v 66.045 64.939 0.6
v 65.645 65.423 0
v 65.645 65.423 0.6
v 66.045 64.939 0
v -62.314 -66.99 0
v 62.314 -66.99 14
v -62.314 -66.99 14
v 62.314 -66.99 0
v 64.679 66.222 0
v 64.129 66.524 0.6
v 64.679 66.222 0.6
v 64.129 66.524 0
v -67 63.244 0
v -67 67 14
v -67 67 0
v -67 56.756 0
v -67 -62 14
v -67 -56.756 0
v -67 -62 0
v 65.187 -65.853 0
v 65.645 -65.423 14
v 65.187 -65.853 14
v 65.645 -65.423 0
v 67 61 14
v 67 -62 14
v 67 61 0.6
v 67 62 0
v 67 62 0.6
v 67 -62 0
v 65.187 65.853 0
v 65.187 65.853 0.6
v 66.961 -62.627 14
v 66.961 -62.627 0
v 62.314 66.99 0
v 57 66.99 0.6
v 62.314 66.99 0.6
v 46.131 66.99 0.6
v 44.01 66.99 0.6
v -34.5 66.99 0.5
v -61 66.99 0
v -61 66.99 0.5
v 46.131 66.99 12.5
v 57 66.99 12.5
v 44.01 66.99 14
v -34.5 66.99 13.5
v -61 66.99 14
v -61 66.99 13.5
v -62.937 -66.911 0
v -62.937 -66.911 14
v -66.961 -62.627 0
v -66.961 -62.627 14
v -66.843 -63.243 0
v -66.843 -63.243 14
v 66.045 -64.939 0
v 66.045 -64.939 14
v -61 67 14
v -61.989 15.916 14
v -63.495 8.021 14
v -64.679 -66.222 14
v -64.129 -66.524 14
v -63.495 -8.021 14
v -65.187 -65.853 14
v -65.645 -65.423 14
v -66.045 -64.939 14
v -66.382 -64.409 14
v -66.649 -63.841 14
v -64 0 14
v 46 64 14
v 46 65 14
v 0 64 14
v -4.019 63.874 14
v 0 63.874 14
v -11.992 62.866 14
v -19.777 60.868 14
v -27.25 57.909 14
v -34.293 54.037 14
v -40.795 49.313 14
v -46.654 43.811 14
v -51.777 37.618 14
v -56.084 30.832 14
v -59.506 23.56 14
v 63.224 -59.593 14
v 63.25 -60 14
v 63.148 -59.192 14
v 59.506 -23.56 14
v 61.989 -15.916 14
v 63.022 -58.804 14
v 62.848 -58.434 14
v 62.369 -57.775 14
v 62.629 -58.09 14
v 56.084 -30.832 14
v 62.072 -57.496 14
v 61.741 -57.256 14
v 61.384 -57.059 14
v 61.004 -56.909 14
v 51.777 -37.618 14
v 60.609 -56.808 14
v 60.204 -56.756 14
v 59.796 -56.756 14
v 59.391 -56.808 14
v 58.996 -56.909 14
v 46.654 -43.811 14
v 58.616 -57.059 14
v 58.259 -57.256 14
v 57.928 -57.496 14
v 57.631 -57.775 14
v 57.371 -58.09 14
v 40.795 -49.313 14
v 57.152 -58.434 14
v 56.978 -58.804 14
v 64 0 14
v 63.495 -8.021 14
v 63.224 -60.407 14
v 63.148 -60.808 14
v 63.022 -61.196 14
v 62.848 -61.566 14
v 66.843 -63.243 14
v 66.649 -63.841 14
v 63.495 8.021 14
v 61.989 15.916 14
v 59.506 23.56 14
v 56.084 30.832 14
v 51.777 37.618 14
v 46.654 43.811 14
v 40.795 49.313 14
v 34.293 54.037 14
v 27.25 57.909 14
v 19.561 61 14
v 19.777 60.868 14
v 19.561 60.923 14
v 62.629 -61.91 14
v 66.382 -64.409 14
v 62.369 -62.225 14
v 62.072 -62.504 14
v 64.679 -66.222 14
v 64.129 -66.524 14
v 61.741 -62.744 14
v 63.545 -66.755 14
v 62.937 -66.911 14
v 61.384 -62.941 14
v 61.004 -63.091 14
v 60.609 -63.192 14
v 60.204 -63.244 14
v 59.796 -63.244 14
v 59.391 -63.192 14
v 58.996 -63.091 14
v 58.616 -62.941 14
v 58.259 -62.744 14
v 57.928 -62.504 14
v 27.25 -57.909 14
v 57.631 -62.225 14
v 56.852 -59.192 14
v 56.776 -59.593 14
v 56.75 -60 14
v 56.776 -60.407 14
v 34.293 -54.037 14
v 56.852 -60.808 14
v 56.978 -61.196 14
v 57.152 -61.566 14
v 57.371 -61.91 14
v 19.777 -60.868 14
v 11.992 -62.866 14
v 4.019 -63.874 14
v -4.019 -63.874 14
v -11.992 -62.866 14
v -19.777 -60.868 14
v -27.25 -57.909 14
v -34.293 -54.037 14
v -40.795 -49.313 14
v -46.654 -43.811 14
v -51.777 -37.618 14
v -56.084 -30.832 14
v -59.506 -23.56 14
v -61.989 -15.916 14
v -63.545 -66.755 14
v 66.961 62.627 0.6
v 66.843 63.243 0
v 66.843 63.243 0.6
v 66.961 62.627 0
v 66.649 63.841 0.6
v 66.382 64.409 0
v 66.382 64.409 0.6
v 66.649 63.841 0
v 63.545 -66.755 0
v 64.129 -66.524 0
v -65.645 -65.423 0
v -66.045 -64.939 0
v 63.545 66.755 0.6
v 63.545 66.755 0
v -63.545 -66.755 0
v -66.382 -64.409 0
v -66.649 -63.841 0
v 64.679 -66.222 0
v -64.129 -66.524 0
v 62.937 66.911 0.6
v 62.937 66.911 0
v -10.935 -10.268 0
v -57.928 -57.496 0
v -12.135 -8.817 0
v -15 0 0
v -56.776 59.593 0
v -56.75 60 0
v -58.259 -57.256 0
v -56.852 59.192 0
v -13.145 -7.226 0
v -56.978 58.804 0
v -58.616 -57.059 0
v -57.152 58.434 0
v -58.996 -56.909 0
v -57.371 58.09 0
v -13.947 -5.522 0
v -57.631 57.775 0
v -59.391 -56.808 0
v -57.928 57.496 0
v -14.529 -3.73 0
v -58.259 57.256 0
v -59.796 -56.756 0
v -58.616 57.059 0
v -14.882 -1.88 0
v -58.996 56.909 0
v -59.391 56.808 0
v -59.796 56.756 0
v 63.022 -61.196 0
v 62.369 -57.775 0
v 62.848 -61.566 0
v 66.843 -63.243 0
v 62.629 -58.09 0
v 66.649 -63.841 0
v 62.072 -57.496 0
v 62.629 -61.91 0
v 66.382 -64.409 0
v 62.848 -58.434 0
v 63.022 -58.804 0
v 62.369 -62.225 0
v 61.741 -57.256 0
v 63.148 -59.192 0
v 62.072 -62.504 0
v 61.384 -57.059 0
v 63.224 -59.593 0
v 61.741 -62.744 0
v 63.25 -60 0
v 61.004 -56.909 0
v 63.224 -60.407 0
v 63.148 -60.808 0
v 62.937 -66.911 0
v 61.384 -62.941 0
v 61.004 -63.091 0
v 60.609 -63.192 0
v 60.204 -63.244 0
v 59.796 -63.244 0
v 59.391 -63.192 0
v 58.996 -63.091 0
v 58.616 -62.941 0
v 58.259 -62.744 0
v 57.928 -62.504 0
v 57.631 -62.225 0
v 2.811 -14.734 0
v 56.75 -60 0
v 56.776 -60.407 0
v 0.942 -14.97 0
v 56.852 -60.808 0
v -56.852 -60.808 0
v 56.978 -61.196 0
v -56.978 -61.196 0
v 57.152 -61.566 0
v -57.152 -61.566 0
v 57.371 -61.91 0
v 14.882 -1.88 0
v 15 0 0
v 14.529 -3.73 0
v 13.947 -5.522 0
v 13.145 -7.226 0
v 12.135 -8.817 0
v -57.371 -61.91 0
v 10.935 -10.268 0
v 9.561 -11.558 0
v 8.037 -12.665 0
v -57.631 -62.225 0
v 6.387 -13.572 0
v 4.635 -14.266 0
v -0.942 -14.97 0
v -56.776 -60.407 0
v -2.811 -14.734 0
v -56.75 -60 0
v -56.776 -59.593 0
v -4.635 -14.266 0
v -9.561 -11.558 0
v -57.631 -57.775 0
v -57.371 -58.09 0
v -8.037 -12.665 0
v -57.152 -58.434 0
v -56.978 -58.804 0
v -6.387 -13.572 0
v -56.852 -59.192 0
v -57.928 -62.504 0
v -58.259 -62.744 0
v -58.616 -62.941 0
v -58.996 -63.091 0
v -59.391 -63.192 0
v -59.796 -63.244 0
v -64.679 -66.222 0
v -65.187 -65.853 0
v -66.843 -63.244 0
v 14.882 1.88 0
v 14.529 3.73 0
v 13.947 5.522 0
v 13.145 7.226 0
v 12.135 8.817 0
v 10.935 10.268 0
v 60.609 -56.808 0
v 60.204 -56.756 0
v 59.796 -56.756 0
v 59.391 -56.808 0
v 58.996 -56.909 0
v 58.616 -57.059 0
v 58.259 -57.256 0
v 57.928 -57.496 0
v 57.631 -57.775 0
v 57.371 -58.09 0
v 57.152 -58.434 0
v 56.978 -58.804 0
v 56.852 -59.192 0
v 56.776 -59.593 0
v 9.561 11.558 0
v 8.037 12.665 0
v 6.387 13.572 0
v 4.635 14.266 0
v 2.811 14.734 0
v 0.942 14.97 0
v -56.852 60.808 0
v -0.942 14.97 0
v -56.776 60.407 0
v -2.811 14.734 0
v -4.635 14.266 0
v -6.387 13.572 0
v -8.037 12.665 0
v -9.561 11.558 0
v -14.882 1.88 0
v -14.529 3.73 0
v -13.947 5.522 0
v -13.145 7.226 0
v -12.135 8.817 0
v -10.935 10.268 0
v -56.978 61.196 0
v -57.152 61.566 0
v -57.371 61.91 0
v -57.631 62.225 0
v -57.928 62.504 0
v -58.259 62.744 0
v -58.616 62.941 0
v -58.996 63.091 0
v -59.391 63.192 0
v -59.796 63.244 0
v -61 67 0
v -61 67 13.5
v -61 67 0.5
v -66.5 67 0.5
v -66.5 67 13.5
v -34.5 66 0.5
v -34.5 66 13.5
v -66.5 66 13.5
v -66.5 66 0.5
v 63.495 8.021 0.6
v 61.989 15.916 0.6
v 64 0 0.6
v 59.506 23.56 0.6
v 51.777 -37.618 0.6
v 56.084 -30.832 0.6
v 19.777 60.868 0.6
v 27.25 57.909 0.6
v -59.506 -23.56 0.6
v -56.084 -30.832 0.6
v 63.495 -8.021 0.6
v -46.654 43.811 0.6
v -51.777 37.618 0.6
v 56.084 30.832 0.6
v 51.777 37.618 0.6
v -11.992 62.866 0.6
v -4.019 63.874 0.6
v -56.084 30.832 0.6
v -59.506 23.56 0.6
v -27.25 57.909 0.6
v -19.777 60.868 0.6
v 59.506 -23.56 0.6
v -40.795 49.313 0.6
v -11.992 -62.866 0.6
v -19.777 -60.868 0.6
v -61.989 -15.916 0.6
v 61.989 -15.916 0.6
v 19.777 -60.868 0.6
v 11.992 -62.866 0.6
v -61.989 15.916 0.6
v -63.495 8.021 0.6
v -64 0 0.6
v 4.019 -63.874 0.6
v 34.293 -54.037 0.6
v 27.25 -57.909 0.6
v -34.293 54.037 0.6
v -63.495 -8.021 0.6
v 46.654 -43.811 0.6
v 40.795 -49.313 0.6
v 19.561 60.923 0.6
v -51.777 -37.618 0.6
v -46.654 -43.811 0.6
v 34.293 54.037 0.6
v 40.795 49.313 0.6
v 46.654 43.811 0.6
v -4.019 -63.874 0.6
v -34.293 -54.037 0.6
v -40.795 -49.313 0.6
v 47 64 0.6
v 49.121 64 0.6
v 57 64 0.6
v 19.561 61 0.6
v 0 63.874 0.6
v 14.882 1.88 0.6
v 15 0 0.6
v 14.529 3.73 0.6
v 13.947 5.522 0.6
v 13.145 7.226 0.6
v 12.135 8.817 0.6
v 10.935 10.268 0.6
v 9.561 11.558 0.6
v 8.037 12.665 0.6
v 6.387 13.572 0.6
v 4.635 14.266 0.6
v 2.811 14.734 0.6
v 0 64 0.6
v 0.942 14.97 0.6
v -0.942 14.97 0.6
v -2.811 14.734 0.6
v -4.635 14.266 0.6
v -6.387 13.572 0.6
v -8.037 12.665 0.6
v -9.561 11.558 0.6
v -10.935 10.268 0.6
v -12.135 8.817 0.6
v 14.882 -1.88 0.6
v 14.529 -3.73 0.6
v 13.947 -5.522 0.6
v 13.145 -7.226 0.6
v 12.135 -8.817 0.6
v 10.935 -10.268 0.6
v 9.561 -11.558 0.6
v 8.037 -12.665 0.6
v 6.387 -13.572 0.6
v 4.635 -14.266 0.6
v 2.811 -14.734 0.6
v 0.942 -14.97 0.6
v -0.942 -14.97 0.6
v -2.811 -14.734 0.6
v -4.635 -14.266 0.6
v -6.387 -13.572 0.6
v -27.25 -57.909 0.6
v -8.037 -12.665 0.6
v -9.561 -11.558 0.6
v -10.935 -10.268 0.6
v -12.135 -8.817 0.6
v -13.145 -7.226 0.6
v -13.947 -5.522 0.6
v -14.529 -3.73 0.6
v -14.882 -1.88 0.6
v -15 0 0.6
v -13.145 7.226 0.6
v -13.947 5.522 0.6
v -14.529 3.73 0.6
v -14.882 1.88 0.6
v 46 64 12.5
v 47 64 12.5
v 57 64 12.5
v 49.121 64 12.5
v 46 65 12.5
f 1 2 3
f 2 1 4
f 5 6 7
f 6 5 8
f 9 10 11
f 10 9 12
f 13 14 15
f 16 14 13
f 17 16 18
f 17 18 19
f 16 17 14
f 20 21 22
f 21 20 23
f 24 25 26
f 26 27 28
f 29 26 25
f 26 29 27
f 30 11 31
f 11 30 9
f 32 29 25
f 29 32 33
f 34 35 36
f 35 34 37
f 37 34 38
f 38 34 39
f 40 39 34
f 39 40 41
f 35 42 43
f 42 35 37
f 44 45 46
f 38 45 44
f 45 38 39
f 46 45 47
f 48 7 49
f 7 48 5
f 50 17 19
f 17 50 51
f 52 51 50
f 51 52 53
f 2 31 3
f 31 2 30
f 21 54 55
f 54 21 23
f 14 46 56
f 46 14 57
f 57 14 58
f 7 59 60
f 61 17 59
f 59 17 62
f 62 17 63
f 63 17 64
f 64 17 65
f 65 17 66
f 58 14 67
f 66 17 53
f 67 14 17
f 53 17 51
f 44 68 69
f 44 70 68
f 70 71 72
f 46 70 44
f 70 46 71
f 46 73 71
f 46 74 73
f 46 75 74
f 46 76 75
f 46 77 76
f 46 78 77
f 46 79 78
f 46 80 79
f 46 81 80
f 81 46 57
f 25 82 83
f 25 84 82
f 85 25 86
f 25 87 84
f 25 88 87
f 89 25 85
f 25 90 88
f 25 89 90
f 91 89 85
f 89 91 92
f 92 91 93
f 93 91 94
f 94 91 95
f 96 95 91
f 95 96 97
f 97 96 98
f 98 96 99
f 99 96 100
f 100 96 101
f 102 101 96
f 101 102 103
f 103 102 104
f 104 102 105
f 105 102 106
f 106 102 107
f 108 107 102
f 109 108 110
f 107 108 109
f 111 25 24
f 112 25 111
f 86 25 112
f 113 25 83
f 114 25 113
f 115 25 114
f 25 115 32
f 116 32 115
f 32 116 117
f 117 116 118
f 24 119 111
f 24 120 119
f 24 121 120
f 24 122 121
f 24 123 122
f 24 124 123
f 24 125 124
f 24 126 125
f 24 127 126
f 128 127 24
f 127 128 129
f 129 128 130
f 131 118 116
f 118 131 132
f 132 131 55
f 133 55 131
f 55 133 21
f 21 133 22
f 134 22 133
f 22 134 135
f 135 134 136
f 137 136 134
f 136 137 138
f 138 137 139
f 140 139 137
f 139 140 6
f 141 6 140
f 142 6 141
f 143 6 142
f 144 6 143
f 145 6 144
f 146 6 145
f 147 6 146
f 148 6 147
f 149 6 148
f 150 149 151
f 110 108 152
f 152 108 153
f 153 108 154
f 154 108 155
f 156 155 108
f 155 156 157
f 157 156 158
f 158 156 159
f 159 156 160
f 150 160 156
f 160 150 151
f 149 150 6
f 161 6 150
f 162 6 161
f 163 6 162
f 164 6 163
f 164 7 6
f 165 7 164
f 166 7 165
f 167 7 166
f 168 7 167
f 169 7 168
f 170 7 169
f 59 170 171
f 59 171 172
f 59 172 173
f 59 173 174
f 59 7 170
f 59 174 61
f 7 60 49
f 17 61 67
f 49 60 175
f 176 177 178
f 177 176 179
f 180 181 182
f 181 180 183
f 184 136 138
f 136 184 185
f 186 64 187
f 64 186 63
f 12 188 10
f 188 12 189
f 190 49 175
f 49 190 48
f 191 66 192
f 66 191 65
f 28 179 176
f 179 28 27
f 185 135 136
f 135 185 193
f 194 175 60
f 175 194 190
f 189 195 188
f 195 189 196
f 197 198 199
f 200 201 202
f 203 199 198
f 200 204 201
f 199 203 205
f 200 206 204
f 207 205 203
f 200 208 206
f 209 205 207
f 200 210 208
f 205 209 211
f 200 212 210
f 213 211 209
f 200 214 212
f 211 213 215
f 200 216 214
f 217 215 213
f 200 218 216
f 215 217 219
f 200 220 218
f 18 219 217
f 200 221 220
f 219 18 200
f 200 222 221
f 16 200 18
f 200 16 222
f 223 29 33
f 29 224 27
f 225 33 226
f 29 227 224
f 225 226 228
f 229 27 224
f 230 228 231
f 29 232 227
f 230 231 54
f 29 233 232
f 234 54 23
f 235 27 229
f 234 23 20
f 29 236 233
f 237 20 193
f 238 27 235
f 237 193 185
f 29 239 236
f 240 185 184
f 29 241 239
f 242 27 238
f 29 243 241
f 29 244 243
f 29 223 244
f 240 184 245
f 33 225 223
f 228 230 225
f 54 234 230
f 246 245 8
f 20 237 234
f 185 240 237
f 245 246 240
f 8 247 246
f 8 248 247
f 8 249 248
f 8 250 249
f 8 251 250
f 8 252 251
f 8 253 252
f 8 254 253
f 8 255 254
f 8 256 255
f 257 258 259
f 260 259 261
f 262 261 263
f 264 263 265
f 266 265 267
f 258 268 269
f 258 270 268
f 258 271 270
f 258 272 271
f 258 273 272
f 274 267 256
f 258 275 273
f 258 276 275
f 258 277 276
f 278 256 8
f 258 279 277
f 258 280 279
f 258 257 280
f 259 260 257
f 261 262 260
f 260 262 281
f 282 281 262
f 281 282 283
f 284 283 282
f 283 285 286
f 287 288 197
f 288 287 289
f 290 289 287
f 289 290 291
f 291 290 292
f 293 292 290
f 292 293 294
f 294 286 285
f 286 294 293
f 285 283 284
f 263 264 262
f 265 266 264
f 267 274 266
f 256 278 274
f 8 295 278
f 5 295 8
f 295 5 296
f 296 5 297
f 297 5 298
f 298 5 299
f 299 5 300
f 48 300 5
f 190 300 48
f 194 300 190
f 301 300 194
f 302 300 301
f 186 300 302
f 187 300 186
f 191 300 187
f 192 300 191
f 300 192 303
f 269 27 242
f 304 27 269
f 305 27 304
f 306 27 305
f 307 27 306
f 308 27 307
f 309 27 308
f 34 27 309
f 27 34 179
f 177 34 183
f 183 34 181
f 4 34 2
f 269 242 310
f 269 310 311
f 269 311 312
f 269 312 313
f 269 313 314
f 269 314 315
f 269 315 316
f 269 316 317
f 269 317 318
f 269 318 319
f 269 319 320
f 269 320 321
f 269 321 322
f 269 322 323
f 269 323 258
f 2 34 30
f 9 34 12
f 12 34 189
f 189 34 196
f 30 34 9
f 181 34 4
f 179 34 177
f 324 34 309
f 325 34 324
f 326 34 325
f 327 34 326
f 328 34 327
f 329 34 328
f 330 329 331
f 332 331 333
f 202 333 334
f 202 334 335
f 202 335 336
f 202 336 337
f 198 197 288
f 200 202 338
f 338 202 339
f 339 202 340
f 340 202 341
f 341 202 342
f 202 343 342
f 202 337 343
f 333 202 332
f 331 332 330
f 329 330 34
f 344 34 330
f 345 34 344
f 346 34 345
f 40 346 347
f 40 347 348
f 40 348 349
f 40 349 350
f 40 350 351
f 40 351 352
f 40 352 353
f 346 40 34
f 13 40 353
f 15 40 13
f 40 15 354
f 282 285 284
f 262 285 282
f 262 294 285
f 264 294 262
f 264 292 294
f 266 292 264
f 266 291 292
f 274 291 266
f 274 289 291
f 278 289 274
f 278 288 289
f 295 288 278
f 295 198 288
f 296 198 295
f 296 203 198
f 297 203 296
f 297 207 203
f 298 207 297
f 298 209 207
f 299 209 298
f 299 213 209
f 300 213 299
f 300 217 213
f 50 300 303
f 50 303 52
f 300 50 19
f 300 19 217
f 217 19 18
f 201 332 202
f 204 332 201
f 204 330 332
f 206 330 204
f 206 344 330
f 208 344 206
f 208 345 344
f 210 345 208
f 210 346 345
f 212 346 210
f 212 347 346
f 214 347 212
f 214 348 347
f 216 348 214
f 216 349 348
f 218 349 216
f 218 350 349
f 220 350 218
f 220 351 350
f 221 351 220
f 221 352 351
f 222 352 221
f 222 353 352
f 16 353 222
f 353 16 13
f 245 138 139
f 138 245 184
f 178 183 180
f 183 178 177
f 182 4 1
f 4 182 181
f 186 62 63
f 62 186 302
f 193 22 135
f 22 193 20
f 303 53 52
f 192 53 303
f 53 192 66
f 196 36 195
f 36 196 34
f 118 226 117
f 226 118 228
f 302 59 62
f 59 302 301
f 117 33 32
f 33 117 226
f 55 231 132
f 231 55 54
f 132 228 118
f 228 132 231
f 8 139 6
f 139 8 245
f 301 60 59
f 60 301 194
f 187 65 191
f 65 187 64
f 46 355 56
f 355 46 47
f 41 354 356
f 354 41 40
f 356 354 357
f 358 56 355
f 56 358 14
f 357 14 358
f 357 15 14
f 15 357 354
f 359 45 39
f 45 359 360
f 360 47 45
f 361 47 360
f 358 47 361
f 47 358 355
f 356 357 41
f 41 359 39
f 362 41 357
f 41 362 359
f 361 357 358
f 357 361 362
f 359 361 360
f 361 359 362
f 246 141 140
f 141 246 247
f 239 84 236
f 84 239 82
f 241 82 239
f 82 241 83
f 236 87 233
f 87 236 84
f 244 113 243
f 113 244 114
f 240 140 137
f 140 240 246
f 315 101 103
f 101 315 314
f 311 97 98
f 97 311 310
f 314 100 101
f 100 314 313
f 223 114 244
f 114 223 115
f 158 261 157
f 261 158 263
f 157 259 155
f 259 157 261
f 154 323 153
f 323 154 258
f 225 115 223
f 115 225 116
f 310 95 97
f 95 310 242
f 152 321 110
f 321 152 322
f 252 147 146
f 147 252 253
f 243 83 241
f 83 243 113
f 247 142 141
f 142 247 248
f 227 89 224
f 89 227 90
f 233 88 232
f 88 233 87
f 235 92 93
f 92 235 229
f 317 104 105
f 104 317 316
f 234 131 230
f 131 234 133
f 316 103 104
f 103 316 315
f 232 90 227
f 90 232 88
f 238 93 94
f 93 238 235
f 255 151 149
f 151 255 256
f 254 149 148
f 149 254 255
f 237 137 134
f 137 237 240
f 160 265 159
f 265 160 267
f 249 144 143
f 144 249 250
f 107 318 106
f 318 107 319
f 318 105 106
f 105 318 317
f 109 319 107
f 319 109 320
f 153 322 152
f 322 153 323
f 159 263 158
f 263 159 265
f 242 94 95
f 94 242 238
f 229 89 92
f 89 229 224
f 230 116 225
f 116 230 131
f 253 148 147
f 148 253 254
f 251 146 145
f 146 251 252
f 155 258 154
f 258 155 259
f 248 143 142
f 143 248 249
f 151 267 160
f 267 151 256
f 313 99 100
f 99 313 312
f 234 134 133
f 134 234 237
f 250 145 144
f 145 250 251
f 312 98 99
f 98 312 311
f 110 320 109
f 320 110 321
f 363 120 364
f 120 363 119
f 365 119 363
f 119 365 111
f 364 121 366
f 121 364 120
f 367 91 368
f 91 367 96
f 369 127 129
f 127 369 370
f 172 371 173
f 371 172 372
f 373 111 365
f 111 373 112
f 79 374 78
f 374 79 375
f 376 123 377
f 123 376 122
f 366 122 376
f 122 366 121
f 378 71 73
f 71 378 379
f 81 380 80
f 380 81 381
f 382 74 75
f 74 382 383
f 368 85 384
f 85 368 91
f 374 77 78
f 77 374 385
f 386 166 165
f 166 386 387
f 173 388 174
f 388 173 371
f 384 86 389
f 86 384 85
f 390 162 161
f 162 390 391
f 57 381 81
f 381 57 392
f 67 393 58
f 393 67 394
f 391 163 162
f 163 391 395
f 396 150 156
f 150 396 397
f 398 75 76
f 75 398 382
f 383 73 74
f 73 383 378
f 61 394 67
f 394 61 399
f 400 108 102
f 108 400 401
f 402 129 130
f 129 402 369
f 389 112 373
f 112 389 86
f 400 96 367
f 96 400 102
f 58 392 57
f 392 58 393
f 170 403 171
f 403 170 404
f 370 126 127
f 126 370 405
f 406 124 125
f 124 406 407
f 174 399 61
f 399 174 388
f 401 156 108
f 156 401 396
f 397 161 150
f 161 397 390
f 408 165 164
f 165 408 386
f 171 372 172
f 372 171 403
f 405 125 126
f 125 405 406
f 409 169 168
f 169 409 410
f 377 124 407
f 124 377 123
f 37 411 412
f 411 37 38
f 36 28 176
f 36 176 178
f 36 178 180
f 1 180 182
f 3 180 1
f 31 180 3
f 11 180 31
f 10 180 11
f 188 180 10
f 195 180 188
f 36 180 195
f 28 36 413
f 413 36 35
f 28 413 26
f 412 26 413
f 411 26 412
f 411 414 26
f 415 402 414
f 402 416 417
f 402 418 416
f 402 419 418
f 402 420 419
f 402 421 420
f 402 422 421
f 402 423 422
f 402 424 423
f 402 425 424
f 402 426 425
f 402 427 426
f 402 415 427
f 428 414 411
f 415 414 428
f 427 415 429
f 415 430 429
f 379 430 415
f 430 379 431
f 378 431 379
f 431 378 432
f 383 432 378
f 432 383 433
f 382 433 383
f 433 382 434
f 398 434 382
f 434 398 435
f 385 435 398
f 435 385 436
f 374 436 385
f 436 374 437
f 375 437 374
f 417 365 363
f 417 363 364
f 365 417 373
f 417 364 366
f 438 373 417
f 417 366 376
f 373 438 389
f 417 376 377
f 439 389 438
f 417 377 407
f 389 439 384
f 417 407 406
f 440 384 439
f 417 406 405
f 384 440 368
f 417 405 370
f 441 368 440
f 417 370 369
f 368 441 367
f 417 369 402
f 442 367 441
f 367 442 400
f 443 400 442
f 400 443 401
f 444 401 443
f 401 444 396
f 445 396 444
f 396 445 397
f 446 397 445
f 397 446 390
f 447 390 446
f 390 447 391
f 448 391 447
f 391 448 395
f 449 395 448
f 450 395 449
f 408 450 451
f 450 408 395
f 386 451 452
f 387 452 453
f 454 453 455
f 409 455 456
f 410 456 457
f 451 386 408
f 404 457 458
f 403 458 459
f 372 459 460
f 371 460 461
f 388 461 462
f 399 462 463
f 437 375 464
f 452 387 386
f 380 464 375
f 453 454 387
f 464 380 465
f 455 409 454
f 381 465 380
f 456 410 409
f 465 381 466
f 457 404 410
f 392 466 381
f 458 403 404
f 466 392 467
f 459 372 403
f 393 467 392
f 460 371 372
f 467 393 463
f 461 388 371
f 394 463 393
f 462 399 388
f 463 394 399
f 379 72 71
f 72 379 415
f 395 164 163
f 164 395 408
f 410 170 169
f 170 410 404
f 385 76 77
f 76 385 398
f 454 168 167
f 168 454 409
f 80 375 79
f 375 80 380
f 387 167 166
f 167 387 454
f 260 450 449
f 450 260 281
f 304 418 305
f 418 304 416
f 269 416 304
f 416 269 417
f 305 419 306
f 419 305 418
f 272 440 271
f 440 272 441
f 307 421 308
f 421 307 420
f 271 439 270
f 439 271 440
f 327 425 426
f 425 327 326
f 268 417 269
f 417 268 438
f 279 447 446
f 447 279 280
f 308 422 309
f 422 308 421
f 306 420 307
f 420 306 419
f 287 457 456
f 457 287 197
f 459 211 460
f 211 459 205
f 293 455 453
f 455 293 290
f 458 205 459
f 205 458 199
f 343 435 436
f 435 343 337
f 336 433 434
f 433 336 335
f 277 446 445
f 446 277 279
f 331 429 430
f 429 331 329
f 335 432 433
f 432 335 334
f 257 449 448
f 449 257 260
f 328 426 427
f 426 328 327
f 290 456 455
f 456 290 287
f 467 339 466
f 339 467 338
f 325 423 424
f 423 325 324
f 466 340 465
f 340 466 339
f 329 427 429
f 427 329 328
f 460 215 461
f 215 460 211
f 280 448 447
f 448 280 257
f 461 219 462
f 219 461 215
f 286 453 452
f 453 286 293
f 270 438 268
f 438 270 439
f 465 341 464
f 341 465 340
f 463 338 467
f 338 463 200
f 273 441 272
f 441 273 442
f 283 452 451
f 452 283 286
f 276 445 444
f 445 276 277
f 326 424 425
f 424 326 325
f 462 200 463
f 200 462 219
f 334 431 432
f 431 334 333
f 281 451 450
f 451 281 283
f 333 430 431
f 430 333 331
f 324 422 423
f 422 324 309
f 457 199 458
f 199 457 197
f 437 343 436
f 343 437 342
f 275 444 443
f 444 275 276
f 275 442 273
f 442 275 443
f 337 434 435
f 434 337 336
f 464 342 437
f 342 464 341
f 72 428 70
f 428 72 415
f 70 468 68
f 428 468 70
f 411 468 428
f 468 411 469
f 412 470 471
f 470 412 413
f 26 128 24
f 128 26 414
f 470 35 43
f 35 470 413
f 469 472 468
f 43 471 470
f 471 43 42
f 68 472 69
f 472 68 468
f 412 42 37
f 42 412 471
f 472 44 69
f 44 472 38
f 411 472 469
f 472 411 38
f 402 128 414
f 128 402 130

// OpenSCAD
$fn = 50;


difference() {
	union() {
		hull() {
			translate(v = [-62.0000000000, 62.0000000000, 0]) {
				cylinder(h = 14, r = 5);
			}
			translate(v = [62.0000000000, 62.0000000000, 0]) {
				cylinder(h = 14, r = 5);
			}
			translate(v = [-62.0000000000, -62.0000000000, 0]) {
				cylinder(h = 14, r = 5);
			}
			translate(v = [62.0000000000, -62.0000000000, 0]) {
				cylinder(h = 14, r = 5);
			}
		}
		translate(v = [-67.0000000000, 61.0000000000, 0]) {
			cube(size = [6, 6, 14]);
		}
	}
	union() {
		translate(v = [-67.5000000000, -60.0000000000, -250.0000000000]) {
			rotate(a = [0, 0, 0]) {
				difference() {
					union() {
						hull() {
							translate(v = [7.5000000000, 0, 0]) {
								cylinder(h = 250, r = 3.2500000000, r1 = 3.2500000000, r2 = 3.2500000000);
							}
							translate(v = [-7.5000000000, 0, 0]) {
								cylinder(h = 250, r = 3.2500000000, r1 = 3.2500000000, r2 = 3.2500000000);
							}
						}
					}
					union();
				}
			}
		}
		translate(v = [-67.5000000000, 60.0000000000, -250.0000000000]) {
			rotate(a = [0, 0, 0]) {
				difference() {
					union() {
						hull() {
							translate(v = [7.5000000000, 0, 0]) {
								cylinder(h = 250, r = 3.2500000000, r1 = 3.2500000000, r2 = 3.2500000000);
							}
							translate(v = [-7.5000000000, 0, 0]) {
								cylinder(h = 250, r = 3.2500000000, r1 = 3.2500000000, r2 = 3.2500000000);
							}
						}
					}
					union();
				}
			}
		}
		translate(v = [-66.5000000000, 66.0000000000, 0.5000000000]) {
			cube(size = [32, 1, 13.0000000000]);
		}
		translate(v = [60.0000000000, -60.0000000000, -50.0000000000]) {
			cylinder(h = 100, r = 3.2500000000);
		}
		translate(v = [0, 0, 0.6000000000]) {
			cylinder(h = 16.4000000000, r = 64.0000000000);
		}
		translate(v = [0, 0, -7.0000000000]) {
			cylinder(h = 14, r = 15.0000000000);
		}
		translate(v = [0.0000000000, 61.0000000000, 0.6000000000]) {
			cube(size = [67.0000000000, 3, 16.4000000000]);
		}
		translate(v = [57.0000000000, 61.0000000000, 0.6000000000]) {
			cube(size = [10, 6, 16.4000000000]);
		}
		translate(v = [46.0000000000, 61.0000000000, 12.5000000000]) {
			cube(size = [21, 6, 1.5000000000]);
		}
		translate(v = [43.2500000000, 67.7500000000, 0.6000000000]) {
			rotate(a = [0, 0, -45]) {
				cube(size = [7.5000000000, 1.5000000000, 16.4000000000]);
			}
		}
		translate(v = [12.0610000000, 59.0000000000, 0.6000000000]) {
			cube(size = [7.5000000000, 2, 13.4000000000]);
		}
	}
}
